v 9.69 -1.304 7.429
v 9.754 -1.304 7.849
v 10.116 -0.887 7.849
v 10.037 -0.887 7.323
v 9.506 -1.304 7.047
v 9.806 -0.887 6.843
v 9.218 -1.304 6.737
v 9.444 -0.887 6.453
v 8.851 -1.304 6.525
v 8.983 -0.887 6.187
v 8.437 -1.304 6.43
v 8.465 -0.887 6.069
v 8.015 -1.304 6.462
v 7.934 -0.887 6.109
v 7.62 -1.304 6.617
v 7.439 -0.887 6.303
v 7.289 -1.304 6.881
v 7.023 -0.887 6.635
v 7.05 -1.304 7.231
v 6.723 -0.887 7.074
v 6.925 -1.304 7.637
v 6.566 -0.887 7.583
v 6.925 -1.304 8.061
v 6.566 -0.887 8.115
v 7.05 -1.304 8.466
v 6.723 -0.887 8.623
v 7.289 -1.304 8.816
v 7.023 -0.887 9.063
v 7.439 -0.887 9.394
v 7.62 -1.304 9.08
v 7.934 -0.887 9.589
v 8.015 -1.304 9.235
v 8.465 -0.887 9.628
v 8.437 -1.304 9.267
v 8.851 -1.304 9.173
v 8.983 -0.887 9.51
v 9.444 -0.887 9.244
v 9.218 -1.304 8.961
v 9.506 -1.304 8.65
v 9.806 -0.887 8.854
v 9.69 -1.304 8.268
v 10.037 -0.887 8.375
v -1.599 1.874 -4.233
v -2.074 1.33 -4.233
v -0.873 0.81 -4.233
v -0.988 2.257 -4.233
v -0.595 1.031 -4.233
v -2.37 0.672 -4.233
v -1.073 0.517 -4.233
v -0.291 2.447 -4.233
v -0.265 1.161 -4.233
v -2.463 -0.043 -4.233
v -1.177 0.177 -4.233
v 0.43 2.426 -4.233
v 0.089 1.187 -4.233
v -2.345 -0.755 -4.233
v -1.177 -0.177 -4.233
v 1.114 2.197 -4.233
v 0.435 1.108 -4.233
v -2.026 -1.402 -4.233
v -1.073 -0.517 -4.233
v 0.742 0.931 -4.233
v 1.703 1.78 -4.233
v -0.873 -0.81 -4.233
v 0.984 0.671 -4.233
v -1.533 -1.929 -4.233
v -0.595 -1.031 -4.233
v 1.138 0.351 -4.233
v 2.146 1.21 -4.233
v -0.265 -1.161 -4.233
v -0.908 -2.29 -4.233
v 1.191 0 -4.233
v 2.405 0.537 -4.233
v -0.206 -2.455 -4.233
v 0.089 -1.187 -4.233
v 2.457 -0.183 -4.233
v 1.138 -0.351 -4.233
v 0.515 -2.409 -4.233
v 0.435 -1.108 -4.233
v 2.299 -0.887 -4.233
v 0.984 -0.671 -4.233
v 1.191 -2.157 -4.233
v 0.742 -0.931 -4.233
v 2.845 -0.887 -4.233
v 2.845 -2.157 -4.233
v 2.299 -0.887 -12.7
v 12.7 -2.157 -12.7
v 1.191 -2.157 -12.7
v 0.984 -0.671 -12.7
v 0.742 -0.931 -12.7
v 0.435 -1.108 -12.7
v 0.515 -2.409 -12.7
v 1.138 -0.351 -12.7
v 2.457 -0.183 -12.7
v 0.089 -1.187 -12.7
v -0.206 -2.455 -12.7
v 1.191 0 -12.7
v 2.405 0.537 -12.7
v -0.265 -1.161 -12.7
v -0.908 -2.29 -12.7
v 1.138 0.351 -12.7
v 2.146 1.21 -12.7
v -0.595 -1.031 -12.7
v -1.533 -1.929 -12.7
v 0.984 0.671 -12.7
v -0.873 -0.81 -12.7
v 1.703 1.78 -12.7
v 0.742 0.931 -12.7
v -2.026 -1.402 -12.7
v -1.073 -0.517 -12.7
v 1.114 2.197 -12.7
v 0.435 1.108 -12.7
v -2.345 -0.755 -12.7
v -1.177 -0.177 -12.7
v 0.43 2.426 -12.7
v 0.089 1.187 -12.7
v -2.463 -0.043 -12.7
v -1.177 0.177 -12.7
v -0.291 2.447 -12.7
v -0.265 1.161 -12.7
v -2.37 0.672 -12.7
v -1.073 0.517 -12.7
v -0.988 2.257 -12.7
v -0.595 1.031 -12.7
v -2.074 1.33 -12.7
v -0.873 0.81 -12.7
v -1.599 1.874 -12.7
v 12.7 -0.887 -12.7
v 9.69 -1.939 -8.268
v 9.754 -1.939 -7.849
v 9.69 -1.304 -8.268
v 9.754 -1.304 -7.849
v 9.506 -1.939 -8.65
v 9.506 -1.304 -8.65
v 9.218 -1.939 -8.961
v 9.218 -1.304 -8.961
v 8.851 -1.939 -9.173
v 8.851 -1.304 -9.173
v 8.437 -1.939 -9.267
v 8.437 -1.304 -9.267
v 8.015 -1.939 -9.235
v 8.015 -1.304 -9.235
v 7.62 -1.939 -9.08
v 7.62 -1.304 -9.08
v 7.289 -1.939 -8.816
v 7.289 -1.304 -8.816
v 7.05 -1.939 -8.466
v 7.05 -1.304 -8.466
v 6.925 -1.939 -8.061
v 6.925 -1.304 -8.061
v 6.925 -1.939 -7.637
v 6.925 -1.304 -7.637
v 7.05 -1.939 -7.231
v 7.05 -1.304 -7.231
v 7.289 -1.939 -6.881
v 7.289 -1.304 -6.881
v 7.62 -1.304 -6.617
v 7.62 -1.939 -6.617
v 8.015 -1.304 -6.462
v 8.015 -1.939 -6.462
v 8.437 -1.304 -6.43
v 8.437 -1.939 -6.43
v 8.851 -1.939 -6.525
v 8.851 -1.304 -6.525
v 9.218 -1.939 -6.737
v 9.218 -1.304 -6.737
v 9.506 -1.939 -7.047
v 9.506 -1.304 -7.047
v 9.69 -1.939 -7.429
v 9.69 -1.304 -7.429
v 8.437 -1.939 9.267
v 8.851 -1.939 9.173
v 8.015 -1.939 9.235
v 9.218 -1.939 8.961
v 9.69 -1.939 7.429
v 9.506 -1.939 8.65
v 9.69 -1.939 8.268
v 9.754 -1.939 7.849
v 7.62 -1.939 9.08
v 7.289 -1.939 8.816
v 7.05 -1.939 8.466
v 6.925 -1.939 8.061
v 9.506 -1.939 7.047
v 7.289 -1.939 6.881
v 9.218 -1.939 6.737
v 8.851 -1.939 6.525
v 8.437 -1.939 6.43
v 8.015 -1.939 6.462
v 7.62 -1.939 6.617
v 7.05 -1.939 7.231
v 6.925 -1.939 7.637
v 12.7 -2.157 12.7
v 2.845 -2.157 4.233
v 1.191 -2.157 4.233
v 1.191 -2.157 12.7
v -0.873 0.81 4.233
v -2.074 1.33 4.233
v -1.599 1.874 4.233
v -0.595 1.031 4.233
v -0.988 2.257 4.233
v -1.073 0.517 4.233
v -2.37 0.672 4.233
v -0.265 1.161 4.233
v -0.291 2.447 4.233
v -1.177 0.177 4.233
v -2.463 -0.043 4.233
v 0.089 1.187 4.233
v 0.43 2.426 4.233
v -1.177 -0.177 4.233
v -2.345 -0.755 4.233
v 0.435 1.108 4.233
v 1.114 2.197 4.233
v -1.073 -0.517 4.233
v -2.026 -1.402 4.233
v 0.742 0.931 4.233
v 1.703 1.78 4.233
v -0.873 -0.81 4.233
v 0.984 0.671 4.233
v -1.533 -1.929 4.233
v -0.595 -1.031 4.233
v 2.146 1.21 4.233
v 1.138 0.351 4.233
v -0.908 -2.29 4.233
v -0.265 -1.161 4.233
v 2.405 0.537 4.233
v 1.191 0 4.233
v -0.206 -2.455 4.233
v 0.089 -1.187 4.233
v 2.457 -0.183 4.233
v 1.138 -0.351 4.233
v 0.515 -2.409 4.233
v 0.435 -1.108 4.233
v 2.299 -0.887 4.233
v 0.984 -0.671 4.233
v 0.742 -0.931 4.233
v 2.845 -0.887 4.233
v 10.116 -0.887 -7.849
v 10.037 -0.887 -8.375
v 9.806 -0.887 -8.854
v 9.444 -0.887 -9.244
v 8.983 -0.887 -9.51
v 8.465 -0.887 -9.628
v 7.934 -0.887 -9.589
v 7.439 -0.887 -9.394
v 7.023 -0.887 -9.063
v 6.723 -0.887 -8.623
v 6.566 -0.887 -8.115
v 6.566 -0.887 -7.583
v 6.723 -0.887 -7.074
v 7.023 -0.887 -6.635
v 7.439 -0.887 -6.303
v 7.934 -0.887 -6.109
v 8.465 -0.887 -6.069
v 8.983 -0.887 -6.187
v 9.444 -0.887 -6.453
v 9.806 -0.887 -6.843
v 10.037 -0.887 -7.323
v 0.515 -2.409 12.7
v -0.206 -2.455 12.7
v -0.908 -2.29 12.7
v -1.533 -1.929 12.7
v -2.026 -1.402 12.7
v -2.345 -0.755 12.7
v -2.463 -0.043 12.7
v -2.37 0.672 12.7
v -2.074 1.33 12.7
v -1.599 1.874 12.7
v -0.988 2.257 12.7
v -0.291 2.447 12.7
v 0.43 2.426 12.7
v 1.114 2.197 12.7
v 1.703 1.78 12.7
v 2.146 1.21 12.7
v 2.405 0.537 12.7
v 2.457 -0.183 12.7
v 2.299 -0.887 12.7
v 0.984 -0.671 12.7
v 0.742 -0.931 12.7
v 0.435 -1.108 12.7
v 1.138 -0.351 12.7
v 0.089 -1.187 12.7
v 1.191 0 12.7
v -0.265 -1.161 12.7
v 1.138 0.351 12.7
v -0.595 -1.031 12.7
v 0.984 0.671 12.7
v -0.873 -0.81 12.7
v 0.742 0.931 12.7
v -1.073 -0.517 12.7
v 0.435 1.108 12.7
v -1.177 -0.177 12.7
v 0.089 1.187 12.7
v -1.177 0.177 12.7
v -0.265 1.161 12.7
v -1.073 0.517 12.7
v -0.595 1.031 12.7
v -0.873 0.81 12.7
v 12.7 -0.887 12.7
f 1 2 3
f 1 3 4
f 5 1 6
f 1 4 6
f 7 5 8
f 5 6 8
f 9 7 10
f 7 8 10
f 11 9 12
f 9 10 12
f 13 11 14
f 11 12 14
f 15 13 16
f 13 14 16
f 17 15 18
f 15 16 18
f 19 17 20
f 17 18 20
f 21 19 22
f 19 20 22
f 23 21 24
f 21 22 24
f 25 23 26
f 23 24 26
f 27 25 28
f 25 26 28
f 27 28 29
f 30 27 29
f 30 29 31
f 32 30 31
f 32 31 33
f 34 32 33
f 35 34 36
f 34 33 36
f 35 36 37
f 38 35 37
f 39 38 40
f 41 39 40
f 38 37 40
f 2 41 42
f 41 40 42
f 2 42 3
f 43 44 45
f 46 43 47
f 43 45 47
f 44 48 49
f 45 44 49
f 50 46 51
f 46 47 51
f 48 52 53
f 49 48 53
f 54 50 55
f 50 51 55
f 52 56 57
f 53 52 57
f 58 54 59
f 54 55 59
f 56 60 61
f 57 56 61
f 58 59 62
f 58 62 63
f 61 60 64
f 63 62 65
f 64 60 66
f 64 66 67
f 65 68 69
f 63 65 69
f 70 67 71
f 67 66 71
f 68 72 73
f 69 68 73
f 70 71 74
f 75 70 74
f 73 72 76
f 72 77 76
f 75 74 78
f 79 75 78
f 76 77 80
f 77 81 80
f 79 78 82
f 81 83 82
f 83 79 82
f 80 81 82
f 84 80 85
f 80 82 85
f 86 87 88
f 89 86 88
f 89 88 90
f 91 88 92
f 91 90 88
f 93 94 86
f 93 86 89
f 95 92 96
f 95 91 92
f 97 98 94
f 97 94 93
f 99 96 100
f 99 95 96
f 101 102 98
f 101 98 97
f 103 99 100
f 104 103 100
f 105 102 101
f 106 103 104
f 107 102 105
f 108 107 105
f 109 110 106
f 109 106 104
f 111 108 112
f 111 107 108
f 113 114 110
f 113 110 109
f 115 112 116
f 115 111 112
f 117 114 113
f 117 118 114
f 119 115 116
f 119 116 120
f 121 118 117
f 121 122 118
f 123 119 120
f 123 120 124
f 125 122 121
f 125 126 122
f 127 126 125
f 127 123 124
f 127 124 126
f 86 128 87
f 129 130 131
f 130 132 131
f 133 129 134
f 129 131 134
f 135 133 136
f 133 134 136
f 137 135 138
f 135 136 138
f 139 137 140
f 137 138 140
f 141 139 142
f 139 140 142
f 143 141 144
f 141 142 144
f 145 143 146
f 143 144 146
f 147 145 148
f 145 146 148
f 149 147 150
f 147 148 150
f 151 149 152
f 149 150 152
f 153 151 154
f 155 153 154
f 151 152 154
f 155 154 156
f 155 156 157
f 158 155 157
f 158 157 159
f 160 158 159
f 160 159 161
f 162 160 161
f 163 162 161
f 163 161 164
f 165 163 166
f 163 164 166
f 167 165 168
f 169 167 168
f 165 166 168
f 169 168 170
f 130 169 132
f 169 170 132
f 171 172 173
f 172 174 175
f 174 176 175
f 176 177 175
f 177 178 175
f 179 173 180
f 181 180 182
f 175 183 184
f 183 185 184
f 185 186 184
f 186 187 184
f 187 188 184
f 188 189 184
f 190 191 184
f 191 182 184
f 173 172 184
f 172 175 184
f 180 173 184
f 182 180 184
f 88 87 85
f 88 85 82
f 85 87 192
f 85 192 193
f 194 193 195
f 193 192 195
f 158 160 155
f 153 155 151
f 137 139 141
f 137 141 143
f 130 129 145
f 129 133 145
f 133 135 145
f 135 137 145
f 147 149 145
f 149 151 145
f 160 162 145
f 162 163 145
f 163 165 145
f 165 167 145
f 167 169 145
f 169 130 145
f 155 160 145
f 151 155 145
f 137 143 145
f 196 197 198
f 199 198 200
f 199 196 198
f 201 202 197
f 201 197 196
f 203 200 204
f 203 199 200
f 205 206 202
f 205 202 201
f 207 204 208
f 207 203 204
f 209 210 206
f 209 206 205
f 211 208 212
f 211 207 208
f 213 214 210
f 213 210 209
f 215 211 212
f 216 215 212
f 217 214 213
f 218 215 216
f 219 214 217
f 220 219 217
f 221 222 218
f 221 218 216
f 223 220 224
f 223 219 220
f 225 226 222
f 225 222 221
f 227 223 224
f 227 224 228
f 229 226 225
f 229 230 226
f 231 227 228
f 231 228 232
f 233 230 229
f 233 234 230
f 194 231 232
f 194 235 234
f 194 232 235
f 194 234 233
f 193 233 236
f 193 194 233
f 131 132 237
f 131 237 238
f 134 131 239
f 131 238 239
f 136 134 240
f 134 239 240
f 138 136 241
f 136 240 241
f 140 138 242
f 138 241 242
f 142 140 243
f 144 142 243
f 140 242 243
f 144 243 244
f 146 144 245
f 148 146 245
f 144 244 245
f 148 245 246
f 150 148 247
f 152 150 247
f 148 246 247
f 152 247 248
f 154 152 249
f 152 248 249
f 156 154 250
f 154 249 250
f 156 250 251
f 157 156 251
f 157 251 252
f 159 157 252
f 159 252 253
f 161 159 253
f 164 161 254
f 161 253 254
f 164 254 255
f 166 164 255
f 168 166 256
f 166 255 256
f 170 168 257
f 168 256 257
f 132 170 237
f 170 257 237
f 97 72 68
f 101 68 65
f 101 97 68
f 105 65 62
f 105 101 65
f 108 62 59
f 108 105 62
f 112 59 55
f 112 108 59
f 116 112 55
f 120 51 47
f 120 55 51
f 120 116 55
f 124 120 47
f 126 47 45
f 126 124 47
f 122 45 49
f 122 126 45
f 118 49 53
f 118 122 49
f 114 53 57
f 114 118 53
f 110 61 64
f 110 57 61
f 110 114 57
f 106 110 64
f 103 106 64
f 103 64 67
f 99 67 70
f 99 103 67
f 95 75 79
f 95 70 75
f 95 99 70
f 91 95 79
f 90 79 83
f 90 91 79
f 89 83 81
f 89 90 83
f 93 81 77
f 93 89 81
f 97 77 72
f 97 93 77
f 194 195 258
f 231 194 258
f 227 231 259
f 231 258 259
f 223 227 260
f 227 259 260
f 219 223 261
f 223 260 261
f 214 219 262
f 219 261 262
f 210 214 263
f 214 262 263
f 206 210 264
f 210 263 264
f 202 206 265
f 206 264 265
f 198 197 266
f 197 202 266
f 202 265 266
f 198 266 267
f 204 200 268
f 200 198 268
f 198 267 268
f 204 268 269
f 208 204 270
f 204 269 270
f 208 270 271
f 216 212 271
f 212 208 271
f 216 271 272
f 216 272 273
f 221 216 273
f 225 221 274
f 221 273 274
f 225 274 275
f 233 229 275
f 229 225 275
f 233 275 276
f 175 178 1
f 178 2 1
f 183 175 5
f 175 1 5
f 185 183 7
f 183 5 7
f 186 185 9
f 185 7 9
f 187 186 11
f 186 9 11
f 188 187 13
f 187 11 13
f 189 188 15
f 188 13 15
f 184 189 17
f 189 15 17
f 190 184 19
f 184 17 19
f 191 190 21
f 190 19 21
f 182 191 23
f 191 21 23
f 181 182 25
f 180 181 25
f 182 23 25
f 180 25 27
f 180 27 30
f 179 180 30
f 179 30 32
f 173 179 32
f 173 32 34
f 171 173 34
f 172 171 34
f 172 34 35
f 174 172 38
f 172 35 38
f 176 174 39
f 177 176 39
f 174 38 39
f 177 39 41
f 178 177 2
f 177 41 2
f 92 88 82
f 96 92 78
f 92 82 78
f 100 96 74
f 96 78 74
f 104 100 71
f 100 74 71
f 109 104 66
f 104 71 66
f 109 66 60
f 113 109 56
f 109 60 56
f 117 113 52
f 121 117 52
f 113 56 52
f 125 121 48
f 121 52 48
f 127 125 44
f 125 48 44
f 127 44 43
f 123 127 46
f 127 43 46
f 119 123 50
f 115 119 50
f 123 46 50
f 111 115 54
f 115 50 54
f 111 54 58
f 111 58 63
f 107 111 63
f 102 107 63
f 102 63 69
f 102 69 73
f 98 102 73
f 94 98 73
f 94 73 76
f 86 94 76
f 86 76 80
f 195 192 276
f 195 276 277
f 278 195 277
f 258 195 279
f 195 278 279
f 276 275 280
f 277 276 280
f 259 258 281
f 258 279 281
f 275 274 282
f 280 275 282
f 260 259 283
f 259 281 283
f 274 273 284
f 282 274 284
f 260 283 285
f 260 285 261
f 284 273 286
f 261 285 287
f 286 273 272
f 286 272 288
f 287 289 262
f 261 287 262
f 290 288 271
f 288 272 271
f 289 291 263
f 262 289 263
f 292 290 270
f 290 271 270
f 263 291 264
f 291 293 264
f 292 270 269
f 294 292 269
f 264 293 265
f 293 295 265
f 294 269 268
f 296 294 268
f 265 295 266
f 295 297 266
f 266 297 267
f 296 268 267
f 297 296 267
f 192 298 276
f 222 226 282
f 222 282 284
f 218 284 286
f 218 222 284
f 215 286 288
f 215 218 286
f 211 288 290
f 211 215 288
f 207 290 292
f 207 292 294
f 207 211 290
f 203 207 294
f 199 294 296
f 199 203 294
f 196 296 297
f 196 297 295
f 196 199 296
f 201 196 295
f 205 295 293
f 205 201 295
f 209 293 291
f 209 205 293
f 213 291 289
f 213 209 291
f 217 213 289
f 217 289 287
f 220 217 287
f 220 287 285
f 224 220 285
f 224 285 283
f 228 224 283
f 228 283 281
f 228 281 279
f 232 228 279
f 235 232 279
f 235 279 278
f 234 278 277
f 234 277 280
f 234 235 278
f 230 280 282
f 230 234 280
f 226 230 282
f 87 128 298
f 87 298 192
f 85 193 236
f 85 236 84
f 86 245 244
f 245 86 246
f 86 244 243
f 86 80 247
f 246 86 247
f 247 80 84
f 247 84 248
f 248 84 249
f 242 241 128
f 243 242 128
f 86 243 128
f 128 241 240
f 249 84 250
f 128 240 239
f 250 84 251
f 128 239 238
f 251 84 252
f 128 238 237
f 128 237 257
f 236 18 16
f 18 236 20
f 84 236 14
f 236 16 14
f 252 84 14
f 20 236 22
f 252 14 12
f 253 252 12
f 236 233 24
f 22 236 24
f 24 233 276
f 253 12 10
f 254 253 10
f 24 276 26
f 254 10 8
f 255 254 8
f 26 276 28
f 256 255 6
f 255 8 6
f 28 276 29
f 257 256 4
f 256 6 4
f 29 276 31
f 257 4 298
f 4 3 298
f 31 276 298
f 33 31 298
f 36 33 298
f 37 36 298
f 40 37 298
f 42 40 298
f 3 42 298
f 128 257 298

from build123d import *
from OCP.BRepFilletAPI import BRepFilletAPI_MakeChamfer

# Parameters (mm, degrees)
SKETCH1_R           = 1.190625
EXTRUDE1_DEPTH      = 12.7
SKETCH1_W           = 9.8552
SKETCH1_H           = 1.27
EXTRUDE1_2_DEPTH    = 12.7
SKETCH20_R          = 1.4224
EXTRUDE24_DEPTH     = 20.045522232
CHAMFER2_SIZE       = 0.635
CHAMFER2_SIZE2      = 0.551997079
EXTRUDE4_DEPTH      = 19.94700397
EXTRUDE4_DEPTH_BACK = 19.94700397
SKETCH8_W           = 5.6896
SKETCH8_H           = 8.466666666
SKETCH9_R           = 1.190625
EXTRUDE5_DEPTH      = 8.466666667


# Read off the part's stored shape, not the designer's step: Mirror2
with BuildPart() as part:
    # Sketch1 → Extrude1 (new, symmetric)
    with BuildSketch(Plane.XY):
        with BuildLine():
            Line((12.7, -2.157017049), (1.190625, -2.157017049))
            ThreePointArc((1.190625, -2.157017049), (-1.856577095, 1.619701185), (2.298588957, -0.887017049))
            Line((2.298588957, -0.887017049), (12.7, -0.887017049))
            Line((12.7, -0.887017049), (12.7, -2.157017049))
        make_face()
        Circle(SKETCH1_R, mode=Mode.SUBTRACT)
    extrude(amount=EXTRUDE1_DEPTH, both=True)

    # Mirror2 outline → Mirror2 (revolve, cut)
    with BuildSketch(Plane(origin=(8.3312, 0, -7.8486), x_dir=(1, 0, 0), z_dir=(0, 0, 1))):
        Polygon((1.784715731, -0.887017049), (0, -0.887017049), (0, -1.93881362), (1.4224, -1.93881362), (1.4224, -1.30381362), align=None)
    revolve(axis=Axis((8.3312, 0, -7.8486), (0, 1, 0)), mode=Mode.SUBTRACT)

    # Mirror2 2 outline → Mirror2 2 (revolve, cut)
    with BuildSketch(Plane(origin=(8.3312, 0, 7.8486), x_dir=(1, 0, 0), z_dir=(0, 0, 1))):
        Polygon((0, -0.887017049), (0, -1.93881362), (1.4224, -1.93881362), (1.4224, -1.30381362), (1.784715731, -0.887017049), align=None)
    revolve(axis=Axis((8.3312, 0, 7.8486), (0, 1, 0)), mode=Mode.SUBTRACT)

    # Sketch8 → Extrude4 (cut, two sides: drawn at the far end of the back side and taken through both)
    with BuildSketch(Plane(origin=(0, 0, 0), x_dir=(1, 0, 0), z_dir=(0, 1, 0)).offset(-EXTRUDE4_DEPTH_BACK)):
        Rectangle(SKETCH8_W, SKETCH8_H)
    extrude(amount=EXTRUDE4_DEPTH + EXTRUDE4_DEPTH_BACK, mode=Mode.SUBTRACT)


with BuildPart() as body_2:
    # Sketch1 → Extrude1 2 (new, symmetric)
    with BuildSketch(Plane.XY):
        with Locations((-7.7724, -1.30381362)):
            Rectangle(SKETCH1_W, SKETCH1_H)
    extrude(amount=EXTRUDE1_2_DEPTH, both=True)

    # Sketch20 → Extrude24 (cut, through all)
    with BuildSketch(Plane(origin=(0, -0.66881362, 0), x_dir=(1, 0, 0), z_dir=(0, 1, 0))):
        with Locations(Location((-8.3312, 7.8486, 0), (0, 0, 270))):
            Circle(SKETCH20_R)
        with Locations(Location((-8.3312, -7.8486, 0), (0, 0, 270))):
            Circle(SKETCH20_R)
    extrude(amount=-EXTRUDE24_DEPTH, mode=Mode.SUBTRACT)

    # Chamfer2: one chamfer whose edges measure the first distance from different faces: ONE call of the kernel's chamfer builder (chamfer() names one face for all edges)
    chamfer2_edges_1 = [body_2.edges().sort_by_distance(p)[0] for p in [
        (-8.3312, -0.66881362, -9.271),
    ]]
    chamfer2_side_1 = [body_2.faces().sort_by_distance(p)[0] for p in [
        (-8.3312, -1.30381362, -9.271),
    ]]
    chamfer2_edges_2 = [body_2.edges().sort_by_distance(p)[0] for p in [
        (-8.3312, -0.66881362, 6.4262),
    ]]
    chamfer2_side_2 = [body_2.faces().sort_by_distance(p)[0] for p in [
        (-8.3312, -1.30381362, 6.4262),
    ]]
    chamfer2 = BRepFilletAPI_MakeChamfer(body_2.part.solid().wrapped)
    for e in chamfer2_edges_1:
        chamfer2.Add(CHAMFER2_SIZE, CHAMFER2_SIZE2, e.wrapped, chamfer2_side_1[0].wrapped)  # the first distance lies on this face
    for e in chamfer2_edges_2:
        chamfer2.Add(CHAMFER2_SIZE, CHAMFER2_SIZE2, e.wrapped, chamfer2_side_2[0].wrapped)  # the first distance lies on this face
    add(Compound.cast(chamfer2.Shape()), mode=Mode.REPLACE)

    # Sketch9 → Extrude5 (add)
    with BuildSketch(Plane.XY.offset(-4.233333333)):
        with BuildLine():
            Line((-2.371286314, -0.66881362), (-2.8448, -0.66881362))
            Line((-2.8448, -0.66881362), (-2.8448, -1.93881362))
            Line((-2.8448, -1.93881362), (-1.520300032, -1.93881362))
            ThreePointArc((-1.520300032, -1.93881362), (2.046786768, 1.371486189), (-2.371286314, -0.66881362))
        make_face()
        with Locations(Location((0, 0, 0), (0, 0, 180))):
            Circle(SKETCH9_R, mode=Mode.SUBTRACT)
    extrude(amount=EXTRUDE5_DEPTH)


with BuildPart() as body_3:
    # Sketch6 → Revolve1 (revolve)
    with BuildSketch(Plane(origin=(0, 0, 0), x_dir=(1, 0, 0), z_dir=(0, 1, 0))):
        with BuildLine():
            Line((-2.4638, -12.7), (-2.4638, -13.2715))
            ThreePointArc((-2.4638, -13.2715), (-1.264606924, -13.698253184), (0, -13.843))
            Line((0, -13.843), (0, 13.843))
            ThreePointArc((0, 13.843), (-1.264606924, 13.698253184), (-2.4638, 13.2715))
            Line((-2.4638, 13.2715), (-2.4638, 12.7))
            Line((-2.4638, 12.7), (-1.190625, 12.7))
            Line((-1.190625, 12.7), (-1.190625, -12.7))
            Line((-1.190625, -12.7), (-2.4638, -12.7))
        make_face()
    revolve(axis=Axis((0, 0, -13.843), (0, 0, 1)))


solid = part.part
